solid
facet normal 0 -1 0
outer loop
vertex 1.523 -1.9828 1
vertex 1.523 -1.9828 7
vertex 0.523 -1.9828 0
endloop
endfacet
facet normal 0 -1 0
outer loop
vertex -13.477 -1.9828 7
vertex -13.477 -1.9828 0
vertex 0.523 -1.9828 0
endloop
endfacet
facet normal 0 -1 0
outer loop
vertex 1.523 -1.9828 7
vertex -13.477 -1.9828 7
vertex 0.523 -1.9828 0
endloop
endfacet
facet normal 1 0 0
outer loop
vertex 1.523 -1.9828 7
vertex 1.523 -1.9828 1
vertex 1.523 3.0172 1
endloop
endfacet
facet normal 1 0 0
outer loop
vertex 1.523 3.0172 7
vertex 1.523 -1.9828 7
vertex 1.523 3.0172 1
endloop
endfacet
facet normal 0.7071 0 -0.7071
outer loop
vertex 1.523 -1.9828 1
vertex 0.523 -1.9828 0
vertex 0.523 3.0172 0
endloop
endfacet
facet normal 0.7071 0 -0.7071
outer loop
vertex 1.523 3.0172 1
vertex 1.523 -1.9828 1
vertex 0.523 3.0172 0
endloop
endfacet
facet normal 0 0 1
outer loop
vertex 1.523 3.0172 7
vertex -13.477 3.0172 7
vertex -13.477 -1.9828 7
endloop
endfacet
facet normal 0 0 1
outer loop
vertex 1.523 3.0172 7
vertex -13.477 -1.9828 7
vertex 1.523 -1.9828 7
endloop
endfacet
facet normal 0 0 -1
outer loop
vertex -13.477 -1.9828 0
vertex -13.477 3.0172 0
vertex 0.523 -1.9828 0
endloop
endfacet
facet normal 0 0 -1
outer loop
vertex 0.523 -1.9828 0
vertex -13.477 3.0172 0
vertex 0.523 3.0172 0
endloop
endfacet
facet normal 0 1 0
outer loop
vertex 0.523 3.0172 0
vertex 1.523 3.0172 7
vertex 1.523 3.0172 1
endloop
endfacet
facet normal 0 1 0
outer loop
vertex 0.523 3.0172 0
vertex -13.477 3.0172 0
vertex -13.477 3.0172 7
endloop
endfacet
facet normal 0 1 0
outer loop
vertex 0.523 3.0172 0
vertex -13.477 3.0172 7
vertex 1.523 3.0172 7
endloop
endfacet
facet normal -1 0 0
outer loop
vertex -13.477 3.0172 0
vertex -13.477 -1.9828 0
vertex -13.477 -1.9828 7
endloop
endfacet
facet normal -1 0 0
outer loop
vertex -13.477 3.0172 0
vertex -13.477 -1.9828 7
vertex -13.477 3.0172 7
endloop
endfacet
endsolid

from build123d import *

# Parameters (mm, degrees)
SKETCH_1_W      = 15
SKETCH_1_H      = 5
EXTRUDE_1_DEPTH = 7
CHAMFER_1_SIZE  = 1


with BuildPart() as part:
    # 草图1 → 凸台-拉伸1 (new body)
    with BuildSketch(Plane.XY):
        with Locations((-5.977011494, 0.517241379)):
            Rectangle(SKETCH_1_W, SKETCH_1_H)
    extrude(amount=EXTRUDE_1_DEPTH)

    # 倒角1
    chamfer_1_edges = [part.edges().sort_by_distance(p)[0] for p in [
        (1.522988506, 0.517241379, 0),
    ]]
    chamfer(chamfer_1_edges, length=CHAMFER_1_SIZE)


solid = part.part
